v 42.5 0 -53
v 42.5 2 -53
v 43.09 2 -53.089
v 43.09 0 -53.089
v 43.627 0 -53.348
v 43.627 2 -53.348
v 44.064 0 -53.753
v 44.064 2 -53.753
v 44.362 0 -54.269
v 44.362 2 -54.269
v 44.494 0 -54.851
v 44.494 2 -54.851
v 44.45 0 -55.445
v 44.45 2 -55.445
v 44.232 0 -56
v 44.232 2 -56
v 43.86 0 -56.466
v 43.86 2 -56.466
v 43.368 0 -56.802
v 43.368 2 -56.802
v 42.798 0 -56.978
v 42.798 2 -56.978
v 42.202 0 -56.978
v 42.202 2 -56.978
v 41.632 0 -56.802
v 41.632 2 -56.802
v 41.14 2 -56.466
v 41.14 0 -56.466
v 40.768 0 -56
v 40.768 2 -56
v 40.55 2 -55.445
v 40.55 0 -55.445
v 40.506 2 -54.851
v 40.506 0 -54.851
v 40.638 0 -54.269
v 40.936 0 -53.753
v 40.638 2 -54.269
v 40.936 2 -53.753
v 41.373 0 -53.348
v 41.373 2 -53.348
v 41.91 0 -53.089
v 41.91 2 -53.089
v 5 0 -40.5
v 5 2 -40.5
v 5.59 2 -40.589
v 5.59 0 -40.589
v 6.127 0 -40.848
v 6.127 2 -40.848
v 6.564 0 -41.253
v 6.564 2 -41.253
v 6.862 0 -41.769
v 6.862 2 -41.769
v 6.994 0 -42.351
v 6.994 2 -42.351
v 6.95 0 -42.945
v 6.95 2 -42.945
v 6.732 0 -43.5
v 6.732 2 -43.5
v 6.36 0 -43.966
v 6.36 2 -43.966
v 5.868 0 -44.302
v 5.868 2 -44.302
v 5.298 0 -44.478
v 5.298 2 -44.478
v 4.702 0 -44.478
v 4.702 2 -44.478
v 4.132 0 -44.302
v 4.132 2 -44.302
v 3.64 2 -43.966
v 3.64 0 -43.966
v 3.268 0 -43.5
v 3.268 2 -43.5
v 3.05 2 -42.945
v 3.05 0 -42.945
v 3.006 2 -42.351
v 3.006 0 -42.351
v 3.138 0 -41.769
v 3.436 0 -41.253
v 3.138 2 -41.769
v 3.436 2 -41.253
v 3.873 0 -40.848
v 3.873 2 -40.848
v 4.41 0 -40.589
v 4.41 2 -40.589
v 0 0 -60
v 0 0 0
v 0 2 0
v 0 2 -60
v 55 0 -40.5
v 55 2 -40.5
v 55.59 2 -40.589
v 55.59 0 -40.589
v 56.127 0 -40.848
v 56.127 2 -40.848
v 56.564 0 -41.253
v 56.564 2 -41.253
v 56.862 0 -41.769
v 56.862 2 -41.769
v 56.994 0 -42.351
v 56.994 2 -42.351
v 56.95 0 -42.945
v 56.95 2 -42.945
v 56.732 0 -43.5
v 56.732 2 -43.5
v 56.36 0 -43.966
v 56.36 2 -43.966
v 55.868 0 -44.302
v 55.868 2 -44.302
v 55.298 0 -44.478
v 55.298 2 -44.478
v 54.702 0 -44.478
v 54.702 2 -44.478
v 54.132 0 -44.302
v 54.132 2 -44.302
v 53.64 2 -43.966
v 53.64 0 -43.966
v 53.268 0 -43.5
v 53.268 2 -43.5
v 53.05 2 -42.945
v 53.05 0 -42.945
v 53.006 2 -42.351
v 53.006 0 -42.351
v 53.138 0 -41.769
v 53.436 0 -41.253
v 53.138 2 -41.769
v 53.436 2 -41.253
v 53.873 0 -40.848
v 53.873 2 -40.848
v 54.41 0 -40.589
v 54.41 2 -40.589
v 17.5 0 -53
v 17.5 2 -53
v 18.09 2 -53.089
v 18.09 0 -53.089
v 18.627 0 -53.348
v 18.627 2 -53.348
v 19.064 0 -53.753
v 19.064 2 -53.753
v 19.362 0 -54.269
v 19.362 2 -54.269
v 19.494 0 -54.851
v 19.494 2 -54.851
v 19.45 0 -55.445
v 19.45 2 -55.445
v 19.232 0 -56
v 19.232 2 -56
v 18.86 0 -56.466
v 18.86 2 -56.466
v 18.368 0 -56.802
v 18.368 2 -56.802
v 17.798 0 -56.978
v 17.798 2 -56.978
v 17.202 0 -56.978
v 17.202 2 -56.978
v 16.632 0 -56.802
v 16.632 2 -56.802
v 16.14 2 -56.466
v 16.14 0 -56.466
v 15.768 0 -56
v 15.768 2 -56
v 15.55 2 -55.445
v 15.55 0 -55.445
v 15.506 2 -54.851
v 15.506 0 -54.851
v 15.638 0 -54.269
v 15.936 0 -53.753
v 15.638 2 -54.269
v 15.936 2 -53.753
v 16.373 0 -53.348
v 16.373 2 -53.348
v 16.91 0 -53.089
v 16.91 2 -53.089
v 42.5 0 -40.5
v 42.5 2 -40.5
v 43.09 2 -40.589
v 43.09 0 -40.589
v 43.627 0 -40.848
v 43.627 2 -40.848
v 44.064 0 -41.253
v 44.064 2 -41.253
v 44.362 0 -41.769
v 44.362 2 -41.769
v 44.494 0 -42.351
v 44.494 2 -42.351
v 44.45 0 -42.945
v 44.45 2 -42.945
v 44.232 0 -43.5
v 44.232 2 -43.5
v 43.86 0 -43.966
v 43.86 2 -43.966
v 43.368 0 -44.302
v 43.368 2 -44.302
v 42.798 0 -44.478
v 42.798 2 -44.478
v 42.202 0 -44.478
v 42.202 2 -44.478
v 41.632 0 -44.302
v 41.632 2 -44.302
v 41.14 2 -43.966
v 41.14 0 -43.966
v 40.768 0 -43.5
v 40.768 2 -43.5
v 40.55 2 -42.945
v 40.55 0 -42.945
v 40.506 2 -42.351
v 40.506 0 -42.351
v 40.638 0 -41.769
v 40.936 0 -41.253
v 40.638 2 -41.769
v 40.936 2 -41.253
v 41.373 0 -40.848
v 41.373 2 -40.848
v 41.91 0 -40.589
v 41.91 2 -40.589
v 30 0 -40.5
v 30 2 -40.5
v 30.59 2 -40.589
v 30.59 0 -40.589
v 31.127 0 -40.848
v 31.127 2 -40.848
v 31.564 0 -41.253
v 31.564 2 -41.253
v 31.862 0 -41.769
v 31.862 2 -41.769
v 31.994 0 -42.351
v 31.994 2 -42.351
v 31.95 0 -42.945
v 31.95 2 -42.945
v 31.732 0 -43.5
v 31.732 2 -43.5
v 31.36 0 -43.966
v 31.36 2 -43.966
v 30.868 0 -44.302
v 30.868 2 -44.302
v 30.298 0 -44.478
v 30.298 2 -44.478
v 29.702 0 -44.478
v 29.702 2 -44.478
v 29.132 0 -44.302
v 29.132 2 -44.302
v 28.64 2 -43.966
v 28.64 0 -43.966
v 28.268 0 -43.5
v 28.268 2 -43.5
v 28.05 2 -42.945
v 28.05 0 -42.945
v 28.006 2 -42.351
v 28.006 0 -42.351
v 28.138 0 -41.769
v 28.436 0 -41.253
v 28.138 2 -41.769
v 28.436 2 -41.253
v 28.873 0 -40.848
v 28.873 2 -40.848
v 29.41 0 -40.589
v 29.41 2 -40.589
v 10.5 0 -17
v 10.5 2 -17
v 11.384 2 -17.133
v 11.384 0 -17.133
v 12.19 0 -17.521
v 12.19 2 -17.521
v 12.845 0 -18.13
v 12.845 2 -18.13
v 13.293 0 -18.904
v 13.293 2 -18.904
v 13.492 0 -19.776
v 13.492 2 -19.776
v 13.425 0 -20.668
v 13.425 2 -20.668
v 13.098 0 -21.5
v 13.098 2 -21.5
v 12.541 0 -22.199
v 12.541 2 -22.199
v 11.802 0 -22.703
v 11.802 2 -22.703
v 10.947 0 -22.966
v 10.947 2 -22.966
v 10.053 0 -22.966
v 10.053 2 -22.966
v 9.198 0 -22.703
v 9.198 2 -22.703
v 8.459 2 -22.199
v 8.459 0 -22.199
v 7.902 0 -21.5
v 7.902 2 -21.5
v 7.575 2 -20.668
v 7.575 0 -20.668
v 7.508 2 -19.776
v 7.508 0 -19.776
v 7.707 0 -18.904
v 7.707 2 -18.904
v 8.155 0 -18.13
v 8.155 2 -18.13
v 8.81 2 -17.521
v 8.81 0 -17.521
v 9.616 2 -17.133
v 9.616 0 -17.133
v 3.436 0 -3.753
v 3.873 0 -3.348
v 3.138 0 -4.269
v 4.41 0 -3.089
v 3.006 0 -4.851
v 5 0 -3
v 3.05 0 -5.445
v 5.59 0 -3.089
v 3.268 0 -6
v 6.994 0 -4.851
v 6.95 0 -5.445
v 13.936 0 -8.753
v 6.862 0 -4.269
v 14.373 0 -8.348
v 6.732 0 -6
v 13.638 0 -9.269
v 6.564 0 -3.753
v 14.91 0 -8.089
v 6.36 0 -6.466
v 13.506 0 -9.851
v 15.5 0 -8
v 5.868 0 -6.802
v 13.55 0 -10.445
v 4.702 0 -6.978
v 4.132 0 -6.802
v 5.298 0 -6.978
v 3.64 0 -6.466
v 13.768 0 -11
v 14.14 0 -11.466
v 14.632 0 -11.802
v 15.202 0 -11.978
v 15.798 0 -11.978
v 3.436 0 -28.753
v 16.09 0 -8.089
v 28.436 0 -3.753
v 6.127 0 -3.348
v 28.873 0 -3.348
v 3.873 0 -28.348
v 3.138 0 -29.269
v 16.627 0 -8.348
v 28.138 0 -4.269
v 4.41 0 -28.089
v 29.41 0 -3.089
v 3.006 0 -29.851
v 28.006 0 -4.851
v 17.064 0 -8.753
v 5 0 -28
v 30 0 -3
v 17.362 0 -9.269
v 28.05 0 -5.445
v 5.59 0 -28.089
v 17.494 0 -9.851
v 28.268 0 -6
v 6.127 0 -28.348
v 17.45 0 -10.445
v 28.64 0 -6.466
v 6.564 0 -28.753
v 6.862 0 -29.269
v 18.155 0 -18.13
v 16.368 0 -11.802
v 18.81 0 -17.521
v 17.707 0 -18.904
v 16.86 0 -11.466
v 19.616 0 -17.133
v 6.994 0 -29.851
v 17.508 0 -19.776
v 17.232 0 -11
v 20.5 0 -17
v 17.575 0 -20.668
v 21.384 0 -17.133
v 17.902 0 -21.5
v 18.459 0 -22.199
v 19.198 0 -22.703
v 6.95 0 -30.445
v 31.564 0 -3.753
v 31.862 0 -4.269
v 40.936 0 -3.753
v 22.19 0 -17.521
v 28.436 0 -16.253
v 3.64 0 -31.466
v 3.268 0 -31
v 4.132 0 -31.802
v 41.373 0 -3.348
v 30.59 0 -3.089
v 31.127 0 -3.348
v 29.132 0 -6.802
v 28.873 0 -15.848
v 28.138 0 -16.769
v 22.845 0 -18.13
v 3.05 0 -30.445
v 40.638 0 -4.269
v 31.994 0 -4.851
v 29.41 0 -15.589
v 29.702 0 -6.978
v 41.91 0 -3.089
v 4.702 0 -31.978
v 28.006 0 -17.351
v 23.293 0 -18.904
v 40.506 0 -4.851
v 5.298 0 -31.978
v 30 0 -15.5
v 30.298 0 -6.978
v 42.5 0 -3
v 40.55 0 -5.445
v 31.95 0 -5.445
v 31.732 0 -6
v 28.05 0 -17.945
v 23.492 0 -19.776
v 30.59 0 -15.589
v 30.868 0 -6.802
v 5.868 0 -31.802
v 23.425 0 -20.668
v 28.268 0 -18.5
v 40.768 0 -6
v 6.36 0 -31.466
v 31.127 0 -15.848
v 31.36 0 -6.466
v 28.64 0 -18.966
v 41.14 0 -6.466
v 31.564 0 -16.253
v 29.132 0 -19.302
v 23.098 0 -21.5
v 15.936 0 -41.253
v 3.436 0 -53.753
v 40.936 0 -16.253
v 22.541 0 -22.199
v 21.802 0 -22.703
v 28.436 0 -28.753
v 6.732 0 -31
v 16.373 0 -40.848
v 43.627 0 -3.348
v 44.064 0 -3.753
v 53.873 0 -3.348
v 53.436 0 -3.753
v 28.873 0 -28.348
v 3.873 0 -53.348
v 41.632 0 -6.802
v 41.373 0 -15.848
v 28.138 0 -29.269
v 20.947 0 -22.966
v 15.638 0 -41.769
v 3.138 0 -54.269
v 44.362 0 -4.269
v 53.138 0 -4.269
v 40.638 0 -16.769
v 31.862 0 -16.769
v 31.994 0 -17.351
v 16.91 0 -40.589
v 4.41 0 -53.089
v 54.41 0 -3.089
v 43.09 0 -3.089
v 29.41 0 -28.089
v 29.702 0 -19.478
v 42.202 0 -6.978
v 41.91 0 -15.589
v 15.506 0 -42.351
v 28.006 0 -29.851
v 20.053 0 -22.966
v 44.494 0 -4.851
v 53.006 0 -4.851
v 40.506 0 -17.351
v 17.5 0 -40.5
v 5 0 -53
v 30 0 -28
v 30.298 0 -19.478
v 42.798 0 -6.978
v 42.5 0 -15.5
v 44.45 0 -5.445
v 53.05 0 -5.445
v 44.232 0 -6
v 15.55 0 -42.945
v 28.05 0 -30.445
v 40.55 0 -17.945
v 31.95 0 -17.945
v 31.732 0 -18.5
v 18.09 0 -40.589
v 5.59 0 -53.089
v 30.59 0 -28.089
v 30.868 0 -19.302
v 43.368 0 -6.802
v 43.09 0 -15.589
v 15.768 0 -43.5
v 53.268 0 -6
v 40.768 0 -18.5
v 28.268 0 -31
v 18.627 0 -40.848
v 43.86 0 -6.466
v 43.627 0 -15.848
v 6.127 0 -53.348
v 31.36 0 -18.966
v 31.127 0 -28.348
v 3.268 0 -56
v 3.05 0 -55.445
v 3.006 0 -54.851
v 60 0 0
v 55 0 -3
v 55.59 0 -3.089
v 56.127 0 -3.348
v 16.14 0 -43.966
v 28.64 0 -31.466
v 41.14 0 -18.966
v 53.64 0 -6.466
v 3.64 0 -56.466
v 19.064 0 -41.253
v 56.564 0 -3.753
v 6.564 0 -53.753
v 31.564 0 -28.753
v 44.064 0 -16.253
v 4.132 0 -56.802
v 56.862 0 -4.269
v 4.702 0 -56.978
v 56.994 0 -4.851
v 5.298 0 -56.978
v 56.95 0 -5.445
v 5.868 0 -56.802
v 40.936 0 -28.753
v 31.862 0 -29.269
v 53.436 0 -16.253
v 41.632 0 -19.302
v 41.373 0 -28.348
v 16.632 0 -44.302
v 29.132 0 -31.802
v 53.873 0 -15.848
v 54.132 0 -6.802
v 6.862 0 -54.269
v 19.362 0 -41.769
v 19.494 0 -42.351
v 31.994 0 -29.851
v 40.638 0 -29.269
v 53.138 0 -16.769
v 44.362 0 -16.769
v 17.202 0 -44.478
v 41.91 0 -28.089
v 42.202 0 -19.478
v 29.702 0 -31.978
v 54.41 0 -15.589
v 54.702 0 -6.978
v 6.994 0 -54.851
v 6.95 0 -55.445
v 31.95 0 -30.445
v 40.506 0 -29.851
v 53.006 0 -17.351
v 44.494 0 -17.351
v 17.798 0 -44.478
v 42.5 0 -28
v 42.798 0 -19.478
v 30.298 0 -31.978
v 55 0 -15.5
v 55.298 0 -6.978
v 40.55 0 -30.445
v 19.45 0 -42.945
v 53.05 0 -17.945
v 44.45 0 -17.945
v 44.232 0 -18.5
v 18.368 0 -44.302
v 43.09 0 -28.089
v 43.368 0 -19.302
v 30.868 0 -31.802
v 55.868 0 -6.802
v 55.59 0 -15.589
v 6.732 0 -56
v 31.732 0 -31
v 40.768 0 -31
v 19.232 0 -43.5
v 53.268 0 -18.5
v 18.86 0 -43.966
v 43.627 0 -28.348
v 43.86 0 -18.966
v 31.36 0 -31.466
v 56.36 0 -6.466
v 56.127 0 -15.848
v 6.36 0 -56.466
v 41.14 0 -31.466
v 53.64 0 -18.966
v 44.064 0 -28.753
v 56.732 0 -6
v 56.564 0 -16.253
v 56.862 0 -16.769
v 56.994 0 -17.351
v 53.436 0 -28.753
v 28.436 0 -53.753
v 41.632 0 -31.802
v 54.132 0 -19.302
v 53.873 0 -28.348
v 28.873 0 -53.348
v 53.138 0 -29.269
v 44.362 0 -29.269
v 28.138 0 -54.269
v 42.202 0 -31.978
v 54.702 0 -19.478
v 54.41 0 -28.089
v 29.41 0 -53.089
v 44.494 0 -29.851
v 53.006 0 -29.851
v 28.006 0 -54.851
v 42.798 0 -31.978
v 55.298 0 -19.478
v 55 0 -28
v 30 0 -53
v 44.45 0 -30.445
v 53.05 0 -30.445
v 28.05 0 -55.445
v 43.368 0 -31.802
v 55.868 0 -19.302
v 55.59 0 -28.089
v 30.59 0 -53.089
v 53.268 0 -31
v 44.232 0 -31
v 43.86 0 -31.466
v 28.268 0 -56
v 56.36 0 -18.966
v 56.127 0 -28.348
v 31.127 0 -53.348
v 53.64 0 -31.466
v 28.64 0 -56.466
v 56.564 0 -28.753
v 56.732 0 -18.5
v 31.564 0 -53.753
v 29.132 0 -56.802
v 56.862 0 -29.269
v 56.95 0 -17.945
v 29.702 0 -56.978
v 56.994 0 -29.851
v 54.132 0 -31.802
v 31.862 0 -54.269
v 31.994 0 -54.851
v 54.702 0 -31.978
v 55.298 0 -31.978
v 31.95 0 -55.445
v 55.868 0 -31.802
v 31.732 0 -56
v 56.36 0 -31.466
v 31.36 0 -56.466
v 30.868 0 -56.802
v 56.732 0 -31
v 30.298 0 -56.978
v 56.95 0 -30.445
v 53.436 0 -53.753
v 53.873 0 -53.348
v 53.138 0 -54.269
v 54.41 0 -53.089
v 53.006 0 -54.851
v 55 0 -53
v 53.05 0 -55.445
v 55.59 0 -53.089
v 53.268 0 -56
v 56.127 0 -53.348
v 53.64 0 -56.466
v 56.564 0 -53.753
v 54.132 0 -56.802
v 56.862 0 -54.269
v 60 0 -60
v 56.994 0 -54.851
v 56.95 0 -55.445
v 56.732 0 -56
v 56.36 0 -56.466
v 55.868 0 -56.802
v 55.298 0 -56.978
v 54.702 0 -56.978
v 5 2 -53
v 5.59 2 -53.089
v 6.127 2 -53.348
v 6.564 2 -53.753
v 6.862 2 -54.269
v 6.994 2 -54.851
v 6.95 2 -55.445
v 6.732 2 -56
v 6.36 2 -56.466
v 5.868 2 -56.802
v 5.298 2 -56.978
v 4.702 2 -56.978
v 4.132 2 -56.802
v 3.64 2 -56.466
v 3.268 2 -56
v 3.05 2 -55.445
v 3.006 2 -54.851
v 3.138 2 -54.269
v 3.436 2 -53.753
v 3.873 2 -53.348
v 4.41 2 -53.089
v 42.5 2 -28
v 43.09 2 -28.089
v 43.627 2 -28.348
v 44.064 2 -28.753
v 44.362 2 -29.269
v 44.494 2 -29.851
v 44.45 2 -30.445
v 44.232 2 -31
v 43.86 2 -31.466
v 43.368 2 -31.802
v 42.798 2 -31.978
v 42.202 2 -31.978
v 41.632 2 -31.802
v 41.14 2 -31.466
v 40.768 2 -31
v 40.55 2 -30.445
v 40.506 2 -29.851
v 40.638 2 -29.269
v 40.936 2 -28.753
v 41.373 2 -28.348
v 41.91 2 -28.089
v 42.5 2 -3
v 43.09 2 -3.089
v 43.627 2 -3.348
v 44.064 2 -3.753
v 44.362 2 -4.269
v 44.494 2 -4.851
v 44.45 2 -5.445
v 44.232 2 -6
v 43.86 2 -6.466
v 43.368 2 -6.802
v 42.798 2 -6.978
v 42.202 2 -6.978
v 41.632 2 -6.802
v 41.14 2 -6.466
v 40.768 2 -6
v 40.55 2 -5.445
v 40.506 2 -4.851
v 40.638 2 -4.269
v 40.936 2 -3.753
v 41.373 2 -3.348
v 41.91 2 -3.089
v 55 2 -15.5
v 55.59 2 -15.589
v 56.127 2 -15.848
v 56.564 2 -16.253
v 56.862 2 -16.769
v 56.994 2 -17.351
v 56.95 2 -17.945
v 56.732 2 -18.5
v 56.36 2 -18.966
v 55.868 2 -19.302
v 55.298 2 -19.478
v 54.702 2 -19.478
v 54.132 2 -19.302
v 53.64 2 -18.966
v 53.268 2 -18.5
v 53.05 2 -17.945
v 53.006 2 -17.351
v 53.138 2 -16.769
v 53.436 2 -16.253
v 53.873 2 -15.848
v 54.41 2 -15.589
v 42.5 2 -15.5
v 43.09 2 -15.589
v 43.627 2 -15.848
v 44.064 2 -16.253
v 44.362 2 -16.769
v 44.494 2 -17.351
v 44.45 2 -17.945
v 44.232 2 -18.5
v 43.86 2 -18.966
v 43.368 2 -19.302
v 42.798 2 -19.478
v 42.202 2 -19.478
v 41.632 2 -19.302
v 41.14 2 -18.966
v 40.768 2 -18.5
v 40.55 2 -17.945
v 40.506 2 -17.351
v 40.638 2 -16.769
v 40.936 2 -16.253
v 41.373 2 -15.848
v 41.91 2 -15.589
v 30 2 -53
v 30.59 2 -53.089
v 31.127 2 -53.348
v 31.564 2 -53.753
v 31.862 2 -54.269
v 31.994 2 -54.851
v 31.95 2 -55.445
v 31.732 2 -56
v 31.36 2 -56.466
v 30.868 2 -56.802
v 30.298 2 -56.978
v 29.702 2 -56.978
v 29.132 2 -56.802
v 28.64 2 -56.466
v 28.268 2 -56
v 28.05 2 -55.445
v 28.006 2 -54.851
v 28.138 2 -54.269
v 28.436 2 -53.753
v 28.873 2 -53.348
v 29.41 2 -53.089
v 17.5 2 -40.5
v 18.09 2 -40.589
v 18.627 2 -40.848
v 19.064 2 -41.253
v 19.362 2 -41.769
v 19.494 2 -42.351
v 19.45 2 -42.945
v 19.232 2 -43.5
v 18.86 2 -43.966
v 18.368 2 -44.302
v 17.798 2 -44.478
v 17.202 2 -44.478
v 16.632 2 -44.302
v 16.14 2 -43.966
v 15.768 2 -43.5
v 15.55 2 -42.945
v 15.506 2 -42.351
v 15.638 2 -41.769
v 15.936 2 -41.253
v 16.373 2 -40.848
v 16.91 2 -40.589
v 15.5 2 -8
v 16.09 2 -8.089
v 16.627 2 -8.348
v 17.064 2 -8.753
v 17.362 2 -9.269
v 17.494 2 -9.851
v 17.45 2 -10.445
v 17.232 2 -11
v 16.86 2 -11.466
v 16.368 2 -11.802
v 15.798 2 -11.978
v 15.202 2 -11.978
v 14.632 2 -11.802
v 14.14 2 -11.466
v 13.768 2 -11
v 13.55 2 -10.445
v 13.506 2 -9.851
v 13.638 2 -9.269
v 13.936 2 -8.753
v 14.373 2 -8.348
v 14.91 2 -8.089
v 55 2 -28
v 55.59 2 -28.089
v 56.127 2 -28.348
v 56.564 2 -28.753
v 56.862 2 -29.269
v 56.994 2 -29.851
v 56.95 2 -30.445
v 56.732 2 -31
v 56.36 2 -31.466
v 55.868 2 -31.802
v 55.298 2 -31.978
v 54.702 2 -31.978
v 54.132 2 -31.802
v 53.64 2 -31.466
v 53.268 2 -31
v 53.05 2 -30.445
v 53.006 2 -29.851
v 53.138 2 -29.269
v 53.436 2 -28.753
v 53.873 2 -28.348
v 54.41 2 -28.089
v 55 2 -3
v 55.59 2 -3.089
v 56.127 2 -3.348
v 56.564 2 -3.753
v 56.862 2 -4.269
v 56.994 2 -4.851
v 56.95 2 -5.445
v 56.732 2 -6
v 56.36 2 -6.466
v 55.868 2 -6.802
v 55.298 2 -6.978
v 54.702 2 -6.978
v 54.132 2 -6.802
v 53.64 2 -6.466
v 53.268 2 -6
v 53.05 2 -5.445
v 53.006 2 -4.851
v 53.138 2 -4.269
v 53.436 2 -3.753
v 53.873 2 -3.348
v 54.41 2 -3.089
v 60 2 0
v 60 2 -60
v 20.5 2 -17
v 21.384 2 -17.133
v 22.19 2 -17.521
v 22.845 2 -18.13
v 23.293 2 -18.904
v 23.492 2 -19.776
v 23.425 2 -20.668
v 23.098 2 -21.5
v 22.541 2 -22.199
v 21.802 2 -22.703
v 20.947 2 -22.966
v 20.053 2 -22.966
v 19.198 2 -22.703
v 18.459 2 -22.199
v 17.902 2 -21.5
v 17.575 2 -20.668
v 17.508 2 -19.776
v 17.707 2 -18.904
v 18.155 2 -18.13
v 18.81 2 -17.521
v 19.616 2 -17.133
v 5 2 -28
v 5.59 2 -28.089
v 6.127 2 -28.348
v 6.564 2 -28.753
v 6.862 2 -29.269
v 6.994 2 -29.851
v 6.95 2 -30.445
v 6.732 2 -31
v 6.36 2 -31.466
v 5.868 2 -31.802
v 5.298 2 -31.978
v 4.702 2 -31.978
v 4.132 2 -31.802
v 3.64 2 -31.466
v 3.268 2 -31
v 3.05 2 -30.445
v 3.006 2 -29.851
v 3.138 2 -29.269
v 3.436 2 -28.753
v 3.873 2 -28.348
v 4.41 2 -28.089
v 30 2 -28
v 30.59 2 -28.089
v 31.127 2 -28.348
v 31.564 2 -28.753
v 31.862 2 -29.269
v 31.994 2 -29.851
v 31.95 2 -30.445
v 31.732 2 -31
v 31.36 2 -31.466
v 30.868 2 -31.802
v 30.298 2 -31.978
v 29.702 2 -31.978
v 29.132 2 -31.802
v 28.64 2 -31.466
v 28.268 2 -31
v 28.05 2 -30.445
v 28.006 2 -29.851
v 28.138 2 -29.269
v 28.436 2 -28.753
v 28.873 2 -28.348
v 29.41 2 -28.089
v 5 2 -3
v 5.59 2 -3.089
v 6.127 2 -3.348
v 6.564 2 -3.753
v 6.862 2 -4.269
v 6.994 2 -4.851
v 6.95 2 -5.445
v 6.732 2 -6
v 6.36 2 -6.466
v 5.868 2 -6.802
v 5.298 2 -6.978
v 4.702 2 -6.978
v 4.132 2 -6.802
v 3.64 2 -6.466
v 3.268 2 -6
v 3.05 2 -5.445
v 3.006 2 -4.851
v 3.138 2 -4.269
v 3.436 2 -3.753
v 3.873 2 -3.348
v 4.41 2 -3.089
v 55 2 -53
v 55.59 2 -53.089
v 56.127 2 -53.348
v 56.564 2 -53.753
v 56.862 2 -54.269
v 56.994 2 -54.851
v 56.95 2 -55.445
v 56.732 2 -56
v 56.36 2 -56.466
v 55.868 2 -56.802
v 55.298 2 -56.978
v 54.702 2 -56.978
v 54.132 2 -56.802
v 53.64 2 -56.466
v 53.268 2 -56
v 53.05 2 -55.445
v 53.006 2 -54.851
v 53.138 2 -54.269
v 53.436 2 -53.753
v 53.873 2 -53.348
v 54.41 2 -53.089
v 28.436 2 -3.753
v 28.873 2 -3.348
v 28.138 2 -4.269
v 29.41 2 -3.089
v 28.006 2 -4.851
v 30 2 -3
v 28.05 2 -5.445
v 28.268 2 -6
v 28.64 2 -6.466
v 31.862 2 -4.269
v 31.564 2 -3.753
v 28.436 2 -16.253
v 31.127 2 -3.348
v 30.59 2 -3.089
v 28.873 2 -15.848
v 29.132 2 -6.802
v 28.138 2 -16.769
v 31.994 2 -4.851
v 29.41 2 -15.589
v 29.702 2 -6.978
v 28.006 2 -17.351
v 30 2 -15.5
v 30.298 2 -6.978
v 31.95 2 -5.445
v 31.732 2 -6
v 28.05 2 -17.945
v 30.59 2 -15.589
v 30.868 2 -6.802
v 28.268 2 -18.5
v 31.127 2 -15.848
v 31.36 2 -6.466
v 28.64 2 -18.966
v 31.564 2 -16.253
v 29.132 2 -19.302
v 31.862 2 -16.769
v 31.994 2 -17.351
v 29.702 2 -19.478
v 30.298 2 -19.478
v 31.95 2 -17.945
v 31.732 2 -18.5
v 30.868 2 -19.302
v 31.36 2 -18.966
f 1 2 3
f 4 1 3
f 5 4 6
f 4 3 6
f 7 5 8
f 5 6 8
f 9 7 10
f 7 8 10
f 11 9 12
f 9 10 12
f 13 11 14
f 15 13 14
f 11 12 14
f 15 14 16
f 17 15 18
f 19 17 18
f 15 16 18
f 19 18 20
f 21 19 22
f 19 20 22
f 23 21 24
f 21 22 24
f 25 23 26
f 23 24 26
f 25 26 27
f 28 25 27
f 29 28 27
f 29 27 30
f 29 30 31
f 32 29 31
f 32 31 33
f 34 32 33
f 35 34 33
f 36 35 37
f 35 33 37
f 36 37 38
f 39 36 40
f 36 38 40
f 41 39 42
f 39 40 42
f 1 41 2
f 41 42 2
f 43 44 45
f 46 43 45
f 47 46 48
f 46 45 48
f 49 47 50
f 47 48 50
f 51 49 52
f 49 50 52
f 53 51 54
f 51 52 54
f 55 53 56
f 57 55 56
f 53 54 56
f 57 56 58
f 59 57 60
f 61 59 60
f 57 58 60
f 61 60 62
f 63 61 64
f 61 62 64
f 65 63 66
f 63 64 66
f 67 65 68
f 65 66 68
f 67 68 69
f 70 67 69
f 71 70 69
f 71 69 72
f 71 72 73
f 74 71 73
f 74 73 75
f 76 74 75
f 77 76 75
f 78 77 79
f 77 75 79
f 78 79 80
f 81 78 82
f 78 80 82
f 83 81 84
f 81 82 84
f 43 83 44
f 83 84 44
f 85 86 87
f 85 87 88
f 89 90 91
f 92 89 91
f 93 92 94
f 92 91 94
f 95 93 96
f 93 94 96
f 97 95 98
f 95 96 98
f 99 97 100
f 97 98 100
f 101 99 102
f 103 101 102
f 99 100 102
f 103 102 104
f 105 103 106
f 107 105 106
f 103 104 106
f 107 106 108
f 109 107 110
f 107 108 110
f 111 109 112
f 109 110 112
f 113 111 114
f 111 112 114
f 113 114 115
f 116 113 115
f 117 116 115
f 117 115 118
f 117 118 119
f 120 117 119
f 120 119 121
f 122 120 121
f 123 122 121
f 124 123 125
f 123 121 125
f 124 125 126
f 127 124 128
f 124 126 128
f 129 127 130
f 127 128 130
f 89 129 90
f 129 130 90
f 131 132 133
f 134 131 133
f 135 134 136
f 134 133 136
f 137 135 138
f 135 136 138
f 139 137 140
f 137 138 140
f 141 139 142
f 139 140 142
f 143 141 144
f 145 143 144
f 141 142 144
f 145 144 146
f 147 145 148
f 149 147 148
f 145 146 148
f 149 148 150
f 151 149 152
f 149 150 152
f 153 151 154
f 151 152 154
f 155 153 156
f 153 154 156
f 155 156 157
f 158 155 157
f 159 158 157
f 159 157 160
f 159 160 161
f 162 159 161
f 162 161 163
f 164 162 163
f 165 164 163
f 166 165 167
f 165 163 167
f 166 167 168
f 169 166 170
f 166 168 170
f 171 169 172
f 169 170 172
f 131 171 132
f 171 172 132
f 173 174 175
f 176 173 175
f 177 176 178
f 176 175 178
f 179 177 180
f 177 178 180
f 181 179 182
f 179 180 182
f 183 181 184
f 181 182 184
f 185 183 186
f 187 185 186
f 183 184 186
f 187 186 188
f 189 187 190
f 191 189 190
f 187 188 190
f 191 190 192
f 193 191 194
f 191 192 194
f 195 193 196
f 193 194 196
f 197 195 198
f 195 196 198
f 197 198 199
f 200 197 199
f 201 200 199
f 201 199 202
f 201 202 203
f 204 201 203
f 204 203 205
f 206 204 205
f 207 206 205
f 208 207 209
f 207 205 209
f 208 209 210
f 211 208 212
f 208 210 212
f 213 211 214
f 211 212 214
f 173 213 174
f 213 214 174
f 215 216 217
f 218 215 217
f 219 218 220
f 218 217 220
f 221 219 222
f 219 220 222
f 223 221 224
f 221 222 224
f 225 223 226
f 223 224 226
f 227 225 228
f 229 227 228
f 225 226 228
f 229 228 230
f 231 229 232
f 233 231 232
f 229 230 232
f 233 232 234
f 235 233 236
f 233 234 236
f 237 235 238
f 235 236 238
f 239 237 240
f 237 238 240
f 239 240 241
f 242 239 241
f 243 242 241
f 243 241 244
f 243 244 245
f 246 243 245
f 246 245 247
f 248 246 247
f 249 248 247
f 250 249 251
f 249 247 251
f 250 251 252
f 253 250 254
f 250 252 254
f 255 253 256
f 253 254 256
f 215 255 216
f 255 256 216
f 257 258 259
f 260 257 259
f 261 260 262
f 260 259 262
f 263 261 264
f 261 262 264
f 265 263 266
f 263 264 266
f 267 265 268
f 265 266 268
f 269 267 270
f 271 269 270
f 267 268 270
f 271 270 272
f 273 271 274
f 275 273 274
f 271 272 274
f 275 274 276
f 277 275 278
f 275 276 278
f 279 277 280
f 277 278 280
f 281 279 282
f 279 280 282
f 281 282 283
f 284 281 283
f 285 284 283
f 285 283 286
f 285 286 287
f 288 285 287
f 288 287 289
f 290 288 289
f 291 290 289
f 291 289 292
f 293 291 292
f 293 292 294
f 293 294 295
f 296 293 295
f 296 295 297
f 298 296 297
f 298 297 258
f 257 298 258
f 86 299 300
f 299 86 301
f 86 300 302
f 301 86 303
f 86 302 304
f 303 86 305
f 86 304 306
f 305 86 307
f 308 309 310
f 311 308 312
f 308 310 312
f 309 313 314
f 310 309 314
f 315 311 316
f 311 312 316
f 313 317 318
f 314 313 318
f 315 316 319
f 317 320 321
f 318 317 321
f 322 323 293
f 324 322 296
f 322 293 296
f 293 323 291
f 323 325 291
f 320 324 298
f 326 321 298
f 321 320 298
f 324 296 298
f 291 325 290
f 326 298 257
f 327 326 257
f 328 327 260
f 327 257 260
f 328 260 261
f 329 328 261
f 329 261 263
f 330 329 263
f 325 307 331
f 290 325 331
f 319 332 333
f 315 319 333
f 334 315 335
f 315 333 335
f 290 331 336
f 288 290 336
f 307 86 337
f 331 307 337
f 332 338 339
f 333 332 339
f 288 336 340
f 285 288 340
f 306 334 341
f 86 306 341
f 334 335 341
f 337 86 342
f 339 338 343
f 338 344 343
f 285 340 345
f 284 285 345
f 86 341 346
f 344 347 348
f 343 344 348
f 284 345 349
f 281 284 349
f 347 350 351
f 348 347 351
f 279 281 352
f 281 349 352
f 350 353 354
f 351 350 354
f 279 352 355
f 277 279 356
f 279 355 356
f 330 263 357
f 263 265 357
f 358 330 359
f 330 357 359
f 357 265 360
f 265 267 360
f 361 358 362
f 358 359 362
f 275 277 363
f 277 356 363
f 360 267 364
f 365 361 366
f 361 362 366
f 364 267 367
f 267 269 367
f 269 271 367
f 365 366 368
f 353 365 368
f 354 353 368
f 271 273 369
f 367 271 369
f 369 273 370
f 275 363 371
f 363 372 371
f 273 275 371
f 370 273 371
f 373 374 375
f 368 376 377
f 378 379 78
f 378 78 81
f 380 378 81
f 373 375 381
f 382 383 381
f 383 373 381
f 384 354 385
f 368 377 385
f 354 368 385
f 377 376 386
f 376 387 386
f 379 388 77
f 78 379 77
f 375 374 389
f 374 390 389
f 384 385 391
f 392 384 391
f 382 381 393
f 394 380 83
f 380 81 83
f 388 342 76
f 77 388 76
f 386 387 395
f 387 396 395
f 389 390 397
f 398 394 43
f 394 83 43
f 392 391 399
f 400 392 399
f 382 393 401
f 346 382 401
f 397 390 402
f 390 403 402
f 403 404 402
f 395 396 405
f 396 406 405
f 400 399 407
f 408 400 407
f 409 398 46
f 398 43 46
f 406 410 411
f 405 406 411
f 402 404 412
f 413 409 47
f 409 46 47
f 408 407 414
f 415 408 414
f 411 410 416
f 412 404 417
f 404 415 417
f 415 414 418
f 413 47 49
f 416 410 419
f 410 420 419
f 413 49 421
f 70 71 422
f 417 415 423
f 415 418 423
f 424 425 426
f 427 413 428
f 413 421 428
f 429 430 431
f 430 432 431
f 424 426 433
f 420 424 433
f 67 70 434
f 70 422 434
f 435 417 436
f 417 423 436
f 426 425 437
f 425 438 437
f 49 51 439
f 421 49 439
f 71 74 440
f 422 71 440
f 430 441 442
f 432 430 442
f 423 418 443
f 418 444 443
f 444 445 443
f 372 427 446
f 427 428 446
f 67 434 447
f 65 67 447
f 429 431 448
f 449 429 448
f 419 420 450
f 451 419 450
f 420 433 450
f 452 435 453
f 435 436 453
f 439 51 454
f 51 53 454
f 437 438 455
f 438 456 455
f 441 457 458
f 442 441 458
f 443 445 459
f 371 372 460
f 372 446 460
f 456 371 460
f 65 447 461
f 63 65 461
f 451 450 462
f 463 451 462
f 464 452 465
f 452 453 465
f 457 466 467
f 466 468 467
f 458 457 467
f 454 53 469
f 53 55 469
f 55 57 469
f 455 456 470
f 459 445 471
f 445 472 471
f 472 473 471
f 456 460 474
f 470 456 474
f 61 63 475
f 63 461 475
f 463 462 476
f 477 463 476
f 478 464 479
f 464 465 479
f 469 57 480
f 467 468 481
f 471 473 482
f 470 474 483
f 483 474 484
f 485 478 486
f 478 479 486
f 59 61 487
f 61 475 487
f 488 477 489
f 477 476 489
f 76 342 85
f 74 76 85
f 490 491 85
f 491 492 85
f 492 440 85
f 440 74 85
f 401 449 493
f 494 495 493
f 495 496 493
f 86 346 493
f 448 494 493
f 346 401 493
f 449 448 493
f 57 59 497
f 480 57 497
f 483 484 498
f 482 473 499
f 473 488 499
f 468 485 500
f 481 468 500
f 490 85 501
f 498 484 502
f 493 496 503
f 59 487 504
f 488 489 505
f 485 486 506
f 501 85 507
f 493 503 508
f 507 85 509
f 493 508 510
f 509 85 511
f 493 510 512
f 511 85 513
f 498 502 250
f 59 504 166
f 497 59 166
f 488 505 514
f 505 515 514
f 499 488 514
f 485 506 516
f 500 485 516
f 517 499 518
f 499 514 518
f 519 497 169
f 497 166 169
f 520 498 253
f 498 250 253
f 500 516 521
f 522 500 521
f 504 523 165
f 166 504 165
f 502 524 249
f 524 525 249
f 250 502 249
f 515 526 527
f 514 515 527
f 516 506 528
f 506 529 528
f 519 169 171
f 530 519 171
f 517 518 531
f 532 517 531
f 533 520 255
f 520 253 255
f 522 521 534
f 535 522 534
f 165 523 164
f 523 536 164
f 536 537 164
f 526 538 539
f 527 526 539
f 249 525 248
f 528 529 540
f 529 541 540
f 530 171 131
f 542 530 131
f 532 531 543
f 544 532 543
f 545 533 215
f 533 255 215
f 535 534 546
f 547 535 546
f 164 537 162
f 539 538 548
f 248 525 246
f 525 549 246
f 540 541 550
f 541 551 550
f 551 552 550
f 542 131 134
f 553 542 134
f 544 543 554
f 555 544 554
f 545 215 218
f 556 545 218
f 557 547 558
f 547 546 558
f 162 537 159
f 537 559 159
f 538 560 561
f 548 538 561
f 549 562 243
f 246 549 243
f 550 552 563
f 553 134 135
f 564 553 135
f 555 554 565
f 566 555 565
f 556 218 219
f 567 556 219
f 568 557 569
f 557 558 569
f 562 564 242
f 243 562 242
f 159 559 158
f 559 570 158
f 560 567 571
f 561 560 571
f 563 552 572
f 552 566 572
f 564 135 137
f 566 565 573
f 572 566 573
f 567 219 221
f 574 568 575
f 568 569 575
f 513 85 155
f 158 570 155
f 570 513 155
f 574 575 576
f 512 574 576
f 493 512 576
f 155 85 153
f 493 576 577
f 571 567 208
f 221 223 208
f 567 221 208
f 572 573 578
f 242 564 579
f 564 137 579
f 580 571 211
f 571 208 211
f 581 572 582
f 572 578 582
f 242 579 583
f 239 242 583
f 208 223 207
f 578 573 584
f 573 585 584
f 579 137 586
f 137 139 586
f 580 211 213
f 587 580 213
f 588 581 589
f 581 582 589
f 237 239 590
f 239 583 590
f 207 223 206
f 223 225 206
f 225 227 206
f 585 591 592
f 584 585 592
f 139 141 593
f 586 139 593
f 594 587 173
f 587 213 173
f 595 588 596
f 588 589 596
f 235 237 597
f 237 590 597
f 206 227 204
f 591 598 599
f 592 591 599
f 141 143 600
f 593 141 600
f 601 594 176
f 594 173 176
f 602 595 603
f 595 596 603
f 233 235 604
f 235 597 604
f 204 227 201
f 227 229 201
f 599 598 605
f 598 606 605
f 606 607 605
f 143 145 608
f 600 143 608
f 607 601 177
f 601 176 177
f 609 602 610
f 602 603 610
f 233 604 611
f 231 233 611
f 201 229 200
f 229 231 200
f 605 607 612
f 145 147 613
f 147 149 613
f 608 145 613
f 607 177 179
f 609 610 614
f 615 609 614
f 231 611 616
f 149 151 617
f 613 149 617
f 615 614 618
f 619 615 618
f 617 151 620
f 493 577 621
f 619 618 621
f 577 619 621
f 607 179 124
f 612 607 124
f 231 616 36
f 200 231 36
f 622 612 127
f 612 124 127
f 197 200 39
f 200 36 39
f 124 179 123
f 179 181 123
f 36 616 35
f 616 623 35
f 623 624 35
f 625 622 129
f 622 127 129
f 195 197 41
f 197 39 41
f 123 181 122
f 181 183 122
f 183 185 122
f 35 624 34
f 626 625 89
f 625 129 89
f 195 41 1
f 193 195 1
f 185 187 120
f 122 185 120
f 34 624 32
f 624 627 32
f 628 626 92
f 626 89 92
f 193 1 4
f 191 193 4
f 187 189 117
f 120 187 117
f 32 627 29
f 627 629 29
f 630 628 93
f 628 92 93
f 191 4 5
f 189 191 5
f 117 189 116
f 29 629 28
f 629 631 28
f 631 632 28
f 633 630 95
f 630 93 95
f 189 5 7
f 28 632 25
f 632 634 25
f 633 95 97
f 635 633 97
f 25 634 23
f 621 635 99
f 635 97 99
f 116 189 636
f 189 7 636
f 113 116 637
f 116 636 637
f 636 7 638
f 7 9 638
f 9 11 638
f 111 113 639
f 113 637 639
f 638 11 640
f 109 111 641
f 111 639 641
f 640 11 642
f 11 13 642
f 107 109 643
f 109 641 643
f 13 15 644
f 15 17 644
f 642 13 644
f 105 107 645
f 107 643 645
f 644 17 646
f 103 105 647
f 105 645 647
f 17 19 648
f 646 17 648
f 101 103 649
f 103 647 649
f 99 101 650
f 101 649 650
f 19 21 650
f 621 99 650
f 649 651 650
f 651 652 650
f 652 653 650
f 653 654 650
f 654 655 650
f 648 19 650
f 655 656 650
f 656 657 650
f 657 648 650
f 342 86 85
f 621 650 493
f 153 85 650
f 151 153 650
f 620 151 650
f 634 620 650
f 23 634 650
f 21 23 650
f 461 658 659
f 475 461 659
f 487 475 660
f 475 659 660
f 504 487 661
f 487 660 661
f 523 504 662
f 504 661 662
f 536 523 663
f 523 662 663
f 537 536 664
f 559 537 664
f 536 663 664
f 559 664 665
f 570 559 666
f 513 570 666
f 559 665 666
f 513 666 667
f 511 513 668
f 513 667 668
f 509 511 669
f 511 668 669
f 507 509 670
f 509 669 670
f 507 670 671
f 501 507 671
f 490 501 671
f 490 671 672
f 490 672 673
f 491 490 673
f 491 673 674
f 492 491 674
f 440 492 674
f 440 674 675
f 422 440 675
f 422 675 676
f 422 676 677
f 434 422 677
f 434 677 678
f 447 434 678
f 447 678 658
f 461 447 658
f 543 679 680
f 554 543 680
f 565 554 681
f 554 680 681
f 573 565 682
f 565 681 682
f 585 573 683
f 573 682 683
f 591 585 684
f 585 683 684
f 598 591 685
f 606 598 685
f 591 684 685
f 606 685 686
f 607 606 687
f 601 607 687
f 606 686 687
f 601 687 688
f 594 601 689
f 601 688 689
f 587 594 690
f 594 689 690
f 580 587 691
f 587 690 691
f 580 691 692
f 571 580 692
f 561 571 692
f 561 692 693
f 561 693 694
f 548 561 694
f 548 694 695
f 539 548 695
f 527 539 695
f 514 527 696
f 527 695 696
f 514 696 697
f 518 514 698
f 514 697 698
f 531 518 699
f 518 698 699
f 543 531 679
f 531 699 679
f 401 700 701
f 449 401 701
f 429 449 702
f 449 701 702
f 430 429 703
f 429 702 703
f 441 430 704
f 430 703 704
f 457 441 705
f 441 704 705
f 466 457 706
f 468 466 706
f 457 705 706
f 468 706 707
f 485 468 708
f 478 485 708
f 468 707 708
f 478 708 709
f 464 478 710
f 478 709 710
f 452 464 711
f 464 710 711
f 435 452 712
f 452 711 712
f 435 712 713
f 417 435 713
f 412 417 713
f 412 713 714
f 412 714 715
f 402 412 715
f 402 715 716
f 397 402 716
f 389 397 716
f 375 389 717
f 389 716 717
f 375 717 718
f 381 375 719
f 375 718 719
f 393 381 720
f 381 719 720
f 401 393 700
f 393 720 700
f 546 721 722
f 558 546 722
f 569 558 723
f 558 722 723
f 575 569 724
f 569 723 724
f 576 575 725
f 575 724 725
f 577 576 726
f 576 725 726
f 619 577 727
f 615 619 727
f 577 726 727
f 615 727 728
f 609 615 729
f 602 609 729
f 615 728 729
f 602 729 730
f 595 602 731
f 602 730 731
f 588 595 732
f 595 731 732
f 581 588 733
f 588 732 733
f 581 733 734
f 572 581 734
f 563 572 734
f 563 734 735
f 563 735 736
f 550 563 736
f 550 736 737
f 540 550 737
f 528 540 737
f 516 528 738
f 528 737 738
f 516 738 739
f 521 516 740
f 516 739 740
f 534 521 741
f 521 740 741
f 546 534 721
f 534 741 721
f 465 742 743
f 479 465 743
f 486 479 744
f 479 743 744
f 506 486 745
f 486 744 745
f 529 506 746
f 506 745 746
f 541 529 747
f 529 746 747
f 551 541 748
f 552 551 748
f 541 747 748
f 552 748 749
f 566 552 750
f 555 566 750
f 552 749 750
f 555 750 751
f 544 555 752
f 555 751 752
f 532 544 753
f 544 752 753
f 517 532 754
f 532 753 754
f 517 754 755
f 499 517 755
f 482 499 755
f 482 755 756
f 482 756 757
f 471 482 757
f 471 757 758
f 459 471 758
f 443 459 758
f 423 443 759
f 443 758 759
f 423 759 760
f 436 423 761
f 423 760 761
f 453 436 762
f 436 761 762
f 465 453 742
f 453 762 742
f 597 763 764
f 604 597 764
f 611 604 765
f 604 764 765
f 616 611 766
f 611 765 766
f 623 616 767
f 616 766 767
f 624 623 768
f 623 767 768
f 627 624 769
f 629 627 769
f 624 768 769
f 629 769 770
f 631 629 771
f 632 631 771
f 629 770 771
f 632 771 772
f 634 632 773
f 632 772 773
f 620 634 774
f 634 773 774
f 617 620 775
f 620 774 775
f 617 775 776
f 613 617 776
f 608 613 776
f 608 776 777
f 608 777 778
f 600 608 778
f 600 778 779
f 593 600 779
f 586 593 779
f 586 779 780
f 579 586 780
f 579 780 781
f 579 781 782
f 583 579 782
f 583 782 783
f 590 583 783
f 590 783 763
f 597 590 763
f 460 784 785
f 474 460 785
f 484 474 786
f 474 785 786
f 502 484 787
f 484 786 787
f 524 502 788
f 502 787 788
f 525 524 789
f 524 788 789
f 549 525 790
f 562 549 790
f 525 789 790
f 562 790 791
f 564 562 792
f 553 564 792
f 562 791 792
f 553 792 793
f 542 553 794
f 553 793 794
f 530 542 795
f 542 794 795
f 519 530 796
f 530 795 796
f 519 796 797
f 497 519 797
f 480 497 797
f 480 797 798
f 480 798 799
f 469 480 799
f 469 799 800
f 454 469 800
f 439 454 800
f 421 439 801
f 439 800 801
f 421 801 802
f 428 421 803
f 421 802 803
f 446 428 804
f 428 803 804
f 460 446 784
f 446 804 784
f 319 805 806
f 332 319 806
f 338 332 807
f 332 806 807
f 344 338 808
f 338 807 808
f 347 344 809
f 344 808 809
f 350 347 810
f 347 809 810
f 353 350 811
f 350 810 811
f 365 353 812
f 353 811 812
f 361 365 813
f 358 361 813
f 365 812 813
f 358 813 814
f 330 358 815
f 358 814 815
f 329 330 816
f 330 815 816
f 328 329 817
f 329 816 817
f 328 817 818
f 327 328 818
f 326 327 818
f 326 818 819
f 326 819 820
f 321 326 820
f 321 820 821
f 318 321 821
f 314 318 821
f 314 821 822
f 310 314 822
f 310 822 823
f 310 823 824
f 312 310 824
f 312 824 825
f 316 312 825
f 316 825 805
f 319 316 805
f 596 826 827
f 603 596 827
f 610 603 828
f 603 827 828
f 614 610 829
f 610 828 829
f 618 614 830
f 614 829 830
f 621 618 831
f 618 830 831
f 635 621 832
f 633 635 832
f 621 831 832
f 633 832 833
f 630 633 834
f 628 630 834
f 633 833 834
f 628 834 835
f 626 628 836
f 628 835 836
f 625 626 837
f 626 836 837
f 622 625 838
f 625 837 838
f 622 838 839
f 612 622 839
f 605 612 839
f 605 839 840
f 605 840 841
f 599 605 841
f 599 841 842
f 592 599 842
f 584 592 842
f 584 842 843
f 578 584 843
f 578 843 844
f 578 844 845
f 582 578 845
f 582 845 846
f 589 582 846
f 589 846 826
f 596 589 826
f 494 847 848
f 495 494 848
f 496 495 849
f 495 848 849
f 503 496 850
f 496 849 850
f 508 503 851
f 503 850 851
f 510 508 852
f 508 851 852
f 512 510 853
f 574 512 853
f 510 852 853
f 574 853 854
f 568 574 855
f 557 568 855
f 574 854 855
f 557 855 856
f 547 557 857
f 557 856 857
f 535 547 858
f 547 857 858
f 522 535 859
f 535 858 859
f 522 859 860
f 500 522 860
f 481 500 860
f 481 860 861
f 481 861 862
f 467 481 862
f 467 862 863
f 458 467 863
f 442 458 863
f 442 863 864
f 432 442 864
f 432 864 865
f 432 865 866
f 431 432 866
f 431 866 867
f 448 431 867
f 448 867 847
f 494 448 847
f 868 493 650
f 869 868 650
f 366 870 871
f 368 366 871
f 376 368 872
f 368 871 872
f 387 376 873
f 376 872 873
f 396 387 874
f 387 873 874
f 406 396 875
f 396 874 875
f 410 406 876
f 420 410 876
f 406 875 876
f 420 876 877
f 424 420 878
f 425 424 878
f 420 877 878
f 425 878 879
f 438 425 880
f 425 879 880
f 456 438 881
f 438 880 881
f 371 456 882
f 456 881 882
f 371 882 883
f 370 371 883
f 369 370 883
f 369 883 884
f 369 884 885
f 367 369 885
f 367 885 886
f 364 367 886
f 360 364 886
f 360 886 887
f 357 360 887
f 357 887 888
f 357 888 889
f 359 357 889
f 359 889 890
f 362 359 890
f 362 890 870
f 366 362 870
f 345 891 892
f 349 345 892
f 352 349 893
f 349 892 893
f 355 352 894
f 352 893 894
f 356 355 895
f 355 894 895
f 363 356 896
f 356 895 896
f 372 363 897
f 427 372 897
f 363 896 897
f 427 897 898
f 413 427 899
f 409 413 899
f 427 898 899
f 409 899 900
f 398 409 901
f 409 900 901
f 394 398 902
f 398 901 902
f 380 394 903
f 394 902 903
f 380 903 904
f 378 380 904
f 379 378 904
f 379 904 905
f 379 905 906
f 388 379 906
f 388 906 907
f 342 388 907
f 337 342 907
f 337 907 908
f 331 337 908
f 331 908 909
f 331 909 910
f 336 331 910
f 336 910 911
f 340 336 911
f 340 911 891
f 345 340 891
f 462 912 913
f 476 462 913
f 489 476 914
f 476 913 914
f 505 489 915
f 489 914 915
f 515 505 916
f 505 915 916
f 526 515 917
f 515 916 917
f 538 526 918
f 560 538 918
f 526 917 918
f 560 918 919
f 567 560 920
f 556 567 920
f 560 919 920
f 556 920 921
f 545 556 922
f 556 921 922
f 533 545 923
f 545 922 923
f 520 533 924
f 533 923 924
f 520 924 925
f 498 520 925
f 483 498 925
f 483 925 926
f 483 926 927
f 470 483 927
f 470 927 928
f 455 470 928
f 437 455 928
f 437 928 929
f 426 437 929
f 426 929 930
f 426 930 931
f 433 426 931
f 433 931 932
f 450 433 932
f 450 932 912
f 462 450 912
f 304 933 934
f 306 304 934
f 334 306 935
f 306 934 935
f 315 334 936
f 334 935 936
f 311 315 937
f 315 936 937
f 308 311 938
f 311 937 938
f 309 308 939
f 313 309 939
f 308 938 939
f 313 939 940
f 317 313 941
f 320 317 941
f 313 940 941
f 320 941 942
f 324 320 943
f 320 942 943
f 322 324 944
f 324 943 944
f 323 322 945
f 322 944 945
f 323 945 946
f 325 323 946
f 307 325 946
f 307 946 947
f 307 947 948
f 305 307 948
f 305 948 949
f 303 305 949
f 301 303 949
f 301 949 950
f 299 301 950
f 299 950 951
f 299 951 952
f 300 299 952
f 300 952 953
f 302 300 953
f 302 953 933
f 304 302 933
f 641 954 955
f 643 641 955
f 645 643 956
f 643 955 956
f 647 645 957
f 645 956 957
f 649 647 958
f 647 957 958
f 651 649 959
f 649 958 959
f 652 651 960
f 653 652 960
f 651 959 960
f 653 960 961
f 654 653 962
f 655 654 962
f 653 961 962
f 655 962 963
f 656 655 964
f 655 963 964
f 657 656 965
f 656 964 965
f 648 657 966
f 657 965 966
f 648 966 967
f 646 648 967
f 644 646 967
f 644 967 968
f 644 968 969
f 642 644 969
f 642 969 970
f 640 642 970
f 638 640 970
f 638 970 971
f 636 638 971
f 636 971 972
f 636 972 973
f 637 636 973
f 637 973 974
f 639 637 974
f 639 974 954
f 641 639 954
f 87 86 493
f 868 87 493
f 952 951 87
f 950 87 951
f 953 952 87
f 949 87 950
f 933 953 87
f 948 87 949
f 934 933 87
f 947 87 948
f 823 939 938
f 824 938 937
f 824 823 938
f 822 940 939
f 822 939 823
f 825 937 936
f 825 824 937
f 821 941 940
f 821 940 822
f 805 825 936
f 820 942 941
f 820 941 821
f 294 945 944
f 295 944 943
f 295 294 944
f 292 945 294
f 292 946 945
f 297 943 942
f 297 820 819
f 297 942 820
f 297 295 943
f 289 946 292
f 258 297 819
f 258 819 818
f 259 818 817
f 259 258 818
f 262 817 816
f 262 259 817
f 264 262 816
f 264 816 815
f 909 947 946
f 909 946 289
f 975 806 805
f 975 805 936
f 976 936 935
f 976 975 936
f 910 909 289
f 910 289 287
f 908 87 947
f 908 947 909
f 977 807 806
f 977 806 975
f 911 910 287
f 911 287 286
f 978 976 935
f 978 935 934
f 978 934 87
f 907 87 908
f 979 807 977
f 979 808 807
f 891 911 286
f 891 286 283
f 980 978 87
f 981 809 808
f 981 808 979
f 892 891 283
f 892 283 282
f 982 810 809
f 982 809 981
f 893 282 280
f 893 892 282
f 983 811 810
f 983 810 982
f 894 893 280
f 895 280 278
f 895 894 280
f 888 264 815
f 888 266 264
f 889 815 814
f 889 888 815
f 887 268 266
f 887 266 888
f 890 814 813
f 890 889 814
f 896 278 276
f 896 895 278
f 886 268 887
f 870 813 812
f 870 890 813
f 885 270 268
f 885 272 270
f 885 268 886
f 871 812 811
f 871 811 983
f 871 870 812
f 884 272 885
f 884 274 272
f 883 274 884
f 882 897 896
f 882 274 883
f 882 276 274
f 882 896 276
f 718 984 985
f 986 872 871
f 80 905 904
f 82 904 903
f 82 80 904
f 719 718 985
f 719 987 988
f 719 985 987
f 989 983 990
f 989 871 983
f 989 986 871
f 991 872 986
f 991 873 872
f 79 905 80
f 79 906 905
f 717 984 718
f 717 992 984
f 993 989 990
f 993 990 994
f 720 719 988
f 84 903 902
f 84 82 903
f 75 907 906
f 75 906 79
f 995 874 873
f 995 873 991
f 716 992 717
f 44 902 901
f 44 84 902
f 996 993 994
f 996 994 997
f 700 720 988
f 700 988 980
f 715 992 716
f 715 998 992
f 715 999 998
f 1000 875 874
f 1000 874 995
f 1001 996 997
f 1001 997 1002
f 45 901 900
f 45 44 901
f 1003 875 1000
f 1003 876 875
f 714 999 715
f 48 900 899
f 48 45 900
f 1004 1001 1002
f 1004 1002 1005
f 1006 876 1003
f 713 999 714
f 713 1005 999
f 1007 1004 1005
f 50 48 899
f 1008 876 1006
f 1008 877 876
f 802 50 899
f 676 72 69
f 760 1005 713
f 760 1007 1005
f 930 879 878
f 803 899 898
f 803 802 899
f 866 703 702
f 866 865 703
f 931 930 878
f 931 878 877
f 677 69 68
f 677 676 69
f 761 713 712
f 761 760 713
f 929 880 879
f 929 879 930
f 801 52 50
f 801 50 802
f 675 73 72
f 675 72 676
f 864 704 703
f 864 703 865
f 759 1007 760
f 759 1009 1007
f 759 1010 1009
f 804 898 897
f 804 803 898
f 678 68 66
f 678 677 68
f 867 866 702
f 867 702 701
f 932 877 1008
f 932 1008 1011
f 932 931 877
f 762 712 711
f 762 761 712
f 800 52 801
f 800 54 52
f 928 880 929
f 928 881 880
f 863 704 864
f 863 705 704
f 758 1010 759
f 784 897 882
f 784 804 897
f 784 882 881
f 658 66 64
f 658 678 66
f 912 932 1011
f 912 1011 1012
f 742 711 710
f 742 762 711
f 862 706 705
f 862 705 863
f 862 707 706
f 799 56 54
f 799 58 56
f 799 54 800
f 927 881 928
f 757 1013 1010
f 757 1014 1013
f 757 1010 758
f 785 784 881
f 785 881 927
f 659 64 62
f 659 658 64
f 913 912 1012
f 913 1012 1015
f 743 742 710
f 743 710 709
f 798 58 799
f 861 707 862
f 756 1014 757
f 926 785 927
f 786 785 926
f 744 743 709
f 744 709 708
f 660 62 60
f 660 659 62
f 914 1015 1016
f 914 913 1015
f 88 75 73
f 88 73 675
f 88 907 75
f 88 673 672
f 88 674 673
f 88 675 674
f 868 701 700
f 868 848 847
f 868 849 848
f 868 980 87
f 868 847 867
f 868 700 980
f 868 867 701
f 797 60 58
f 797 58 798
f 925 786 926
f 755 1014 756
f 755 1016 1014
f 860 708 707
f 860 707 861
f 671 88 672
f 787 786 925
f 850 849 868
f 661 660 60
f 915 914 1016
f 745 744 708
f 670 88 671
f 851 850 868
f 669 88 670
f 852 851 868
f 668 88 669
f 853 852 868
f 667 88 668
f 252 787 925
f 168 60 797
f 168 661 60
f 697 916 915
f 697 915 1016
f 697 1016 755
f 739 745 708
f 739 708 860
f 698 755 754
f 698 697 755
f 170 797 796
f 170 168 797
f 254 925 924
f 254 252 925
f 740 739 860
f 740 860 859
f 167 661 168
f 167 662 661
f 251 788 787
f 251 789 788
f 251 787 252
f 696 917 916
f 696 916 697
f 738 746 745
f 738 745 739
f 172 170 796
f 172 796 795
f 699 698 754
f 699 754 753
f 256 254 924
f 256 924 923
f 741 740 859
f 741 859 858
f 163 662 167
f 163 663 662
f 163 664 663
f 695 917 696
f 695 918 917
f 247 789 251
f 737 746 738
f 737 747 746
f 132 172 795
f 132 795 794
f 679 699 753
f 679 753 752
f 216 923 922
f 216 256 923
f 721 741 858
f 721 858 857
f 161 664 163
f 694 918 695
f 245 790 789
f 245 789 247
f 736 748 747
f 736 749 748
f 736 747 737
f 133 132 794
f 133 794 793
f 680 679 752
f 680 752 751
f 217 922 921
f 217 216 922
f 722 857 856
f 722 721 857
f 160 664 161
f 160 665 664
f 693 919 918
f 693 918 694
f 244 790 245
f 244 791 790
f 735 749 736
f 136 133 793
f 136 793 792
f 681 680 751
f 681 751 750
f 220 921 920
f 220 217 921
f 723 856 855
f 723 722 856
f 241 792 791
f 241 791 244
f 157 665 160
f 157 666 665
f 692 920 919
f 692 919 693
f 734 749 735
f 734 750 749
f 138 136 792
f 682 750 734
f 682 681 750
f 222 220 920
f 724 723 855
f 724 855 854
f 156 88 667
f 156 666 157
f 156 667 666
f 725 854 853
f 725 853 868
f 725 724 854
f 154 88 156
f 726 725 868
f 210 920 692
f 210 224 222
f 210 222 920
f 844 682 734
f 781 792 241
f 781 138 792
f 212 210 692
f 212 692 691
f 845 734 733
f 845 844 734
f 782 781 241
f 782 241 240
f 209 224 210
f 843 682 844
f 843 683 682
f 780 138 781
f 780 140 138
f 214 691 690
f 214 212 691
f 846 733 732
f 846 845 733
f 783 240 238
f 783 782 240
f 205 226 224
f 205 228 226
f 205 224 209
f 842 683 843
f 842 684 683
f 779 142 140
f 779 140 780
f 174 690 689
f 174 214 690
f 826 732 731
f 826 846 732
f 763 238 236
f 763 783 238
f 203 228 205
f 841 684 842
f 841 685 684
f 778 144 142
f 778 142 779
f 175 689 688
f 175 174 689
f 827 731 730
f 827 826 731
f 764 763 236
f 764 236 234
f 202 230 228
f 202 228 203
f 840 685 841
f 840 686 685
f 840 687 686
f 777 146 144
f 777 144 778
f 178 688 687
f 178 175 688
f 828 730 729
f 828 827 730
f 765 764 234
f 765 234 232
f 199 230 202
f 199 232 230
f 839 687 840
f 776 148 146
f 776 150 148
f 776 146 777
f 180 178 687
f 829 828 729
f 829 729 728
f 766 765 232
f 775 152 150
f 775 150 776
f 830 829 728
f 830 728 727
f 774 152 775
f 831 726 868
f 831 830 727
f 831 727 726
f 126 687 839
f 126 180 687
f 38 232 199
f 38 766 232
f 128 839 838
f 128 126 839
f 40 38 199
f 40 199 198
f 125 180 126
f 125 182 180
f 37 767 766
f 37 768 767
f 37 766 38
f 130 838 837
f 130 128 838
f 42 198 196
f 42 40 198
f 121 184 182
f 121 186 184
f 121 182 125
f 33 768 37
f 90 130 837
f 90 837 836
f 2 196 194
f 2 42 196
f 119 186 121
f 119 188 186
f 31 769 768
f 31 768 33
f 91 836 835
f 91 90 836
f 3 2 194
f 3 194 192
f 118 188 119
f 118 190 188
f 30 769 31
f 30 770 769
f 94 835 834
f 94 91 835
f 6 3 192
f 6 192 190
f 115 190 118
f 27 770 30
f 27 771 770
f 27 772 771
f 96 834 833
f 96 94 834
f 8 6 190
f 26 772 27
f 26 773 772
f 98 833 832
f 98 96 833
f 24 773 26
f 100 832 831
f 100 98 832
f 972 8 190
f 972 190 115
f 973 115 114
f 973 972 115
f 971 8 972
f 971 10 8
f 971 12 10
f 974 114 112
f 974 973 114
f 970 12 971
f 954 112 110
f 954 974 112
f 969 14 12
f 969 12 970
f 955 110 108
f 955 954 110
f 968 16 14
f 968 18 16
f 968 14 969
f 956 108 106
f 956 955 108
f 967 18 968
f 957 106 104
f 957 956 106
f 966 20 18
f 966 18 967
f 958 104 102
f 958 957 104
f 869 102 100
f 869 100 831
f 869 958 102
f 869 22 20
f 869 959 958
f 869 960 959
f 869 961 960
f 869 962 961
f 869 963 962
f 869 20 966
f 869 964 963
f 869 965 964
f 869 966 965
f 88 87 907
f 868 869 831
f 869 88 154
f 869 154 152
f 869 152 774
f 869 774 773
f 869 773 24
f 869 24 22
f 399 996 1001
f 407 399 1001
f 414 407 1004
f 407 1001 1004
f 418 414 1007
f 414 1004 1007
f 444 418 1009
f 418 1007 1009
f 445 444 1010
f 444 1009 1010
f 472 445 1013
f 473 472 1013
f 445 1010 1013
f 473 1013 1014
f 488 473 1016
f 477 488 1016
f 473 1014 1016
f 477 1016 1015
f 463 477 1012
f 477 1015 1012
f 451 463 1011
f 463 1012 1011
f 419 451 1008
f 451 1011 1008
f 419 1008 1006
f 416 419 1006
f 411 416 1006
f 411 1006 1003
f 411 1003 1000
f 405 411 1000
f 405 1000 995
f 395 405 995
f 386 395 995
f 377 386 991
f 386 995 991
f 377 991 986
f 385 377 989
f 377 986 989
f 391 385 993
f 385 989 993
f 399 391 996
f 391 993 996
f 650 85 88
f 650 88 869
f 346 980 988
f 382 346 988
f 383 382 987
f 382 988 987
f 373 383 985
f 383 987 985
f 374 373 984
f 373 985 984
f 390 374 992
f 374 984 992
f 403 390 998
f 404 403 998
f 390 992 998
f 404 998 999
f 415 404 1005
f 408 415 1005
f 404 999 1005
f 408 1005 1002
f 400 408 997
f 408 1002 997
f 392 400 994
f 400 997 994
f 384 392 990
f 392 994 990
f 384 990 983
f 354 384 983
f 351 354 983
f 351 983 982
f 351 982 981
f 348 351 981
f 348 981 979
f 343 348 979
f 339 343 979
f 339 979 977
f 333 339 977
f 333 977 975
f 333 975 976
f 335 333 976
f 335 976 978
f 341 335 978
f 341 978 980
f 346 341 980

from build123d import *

# Parameters (mm, degrees)
ESQUISSE1_W             = 60
ESQUISSE1_H             = 60
BOSS_EXTRU_1_DEPTH      = 2
ESQUISSE4_R             = 3
ESQUISSE4_R_2           = 2
ENL_V_MAT_EXTRU_1_DEPTH = 10
ESQUISSE5_R             = 2
ENL_V_MAT_EXTRU_2_DEPTH = 10
ESQUISSE12_R            = 2
ENL_V_MAT_EXTRU_5_DEPTH = 2


with BuildPart() as part:
    # Esquisse1 → Boss.-Extru.1 (new body)
    with BuildSketch(Plane(origin=(0, 0, 0), x_dir=(1, 0, 0), z_dir=(0, 1, 0))):
        with Locations((30, 30)):
            Rectangle(ESQUISSE1_W, ESQUISSE1_H)
    extrude(amount=BOSS_EXTRU_1_DEPTH)

    # Esquisse4 → Enlèv. mat.-Extru.1 (cut)
    with BuildSketch(Plane(origin=(0, 2, 0), x_dir=(1, 0, 0), z_dir=(0, 1, 0))):
        with Locations(Location((10.5, 20, 0), (0, 0, 270))):  # turned: the seam where the file's is
            Circle(ESQUISSE4_R)
        with Locations(Location((20.5, 20, 0), (0, 0, 270))):  # turned: the seam where the file's is
            Circle(ESQUISSE4_R)
        with Locations(Location((15.5, 10, 0), (0, 0, 270))):  # turned: the seam where the file's is
            Circle(ESQUISSE4_R_2)
    extrude(amount=-ENL_V_MAT_EXTRU_1_DEPTH, mode=Mode.SUBTRACT)

    # Esquisse5 → Enlèv. mat.-Extru.2 (cut)
    with BuildSketch(Plane(origin=(0, 2, 0), x_dir=(1, 0, 0), z_dir=(0, 1, 0))):
        with Locations(Location((5, 5, 0), (0, 0, 270))):  # turned: the seam where the file's is
            Circle(ESQUISSE5_R)
        with Locations(Location((55, 5, 0), (0, 0, 270))):  # turned: the seam where the file's is
            Circle(ESQUISSE5_R)
        with Locations(Location((55, 55, 0), (0, 0, 270))):  # turned: the seam where the file's is
            Circle(ESQUISSE5_R)
        with Locations(Location((5, 55, 0), (0, 0, 270))):  # turned: the seam where the file's is
            Circle(ESQUISSE5_R)
        with Locations(Location((30, 55, 0), (0, 0, 270))):  # turned: the seam where the file's is
            Circle(ESQUISSE5_R)
        with Locations(Location((30, 5, 0), (0, 0, 270))):  # turned: the seam where the file's is
            Circle(ESQUISSE5_R)
        with Locations(Location((30, 30, 0), (0, 0, 270))):  # turned: the seam where the file's is
            Circle(ESQUISSE5_R)
        with Locations(Location((55, 30, 0), (0, 0, 270))):  # turned: the seam where the file's is
            Circle(ESQUISSE5_R)
        with Locations(Location((5, 30, 0), (0, 0, 270))):  # turned: the seam where the file's is
            Circle(ESQUISSE5_R)
    extrude(amount=-ENL_V_MAT_EXTRU_2_DEPTH, mode=Mode.SUBTRACT)

    # Esquisse12 → Enlèv. mat.-Extru.5 (cut)
    with BuildSketch(Plane(origin=(0, 2, 0), x_dir=(1, 0, 0), z_dir=(0, 1, 0))):
        with Locations(Location((17.5, 55, 0), (0, 0, 270))):  # turned: the seam where the file's is
            Circle(ESQUISSE12_R)
        with Locations(Location((42.5, 55, 0), (0, 0, 270))):  # turned: the seam where the file's is
            Circle(ESQUISSE12_R)
        with Locations(Location((42.5, 42.5, 0), (0, 0, 270))):  # turned: the seam where the file's is
            Circle(ESQUISSE12_R)
        with Locations(Location((17.5, 42.5, 0), (0, 0, 270))):  # turned: the seam where the file's is
            Circle(ESQUISSE12_R)
        with Locations(Location((42.5, 17.5, 0), (0, 0, 270))):  # turned: the seam where the file's is
            Circle(ESQUISSE12_R)
        with Locations(Location((55, 17.5, 0), (0, 0, 270))):  # turned: the seam where the file's is
            Circle(ESQUISSE12_R)
        with Locations(Location((55, 42.5, 0), (0, 0, 270))):  # turned: the seam where the file's is
            Circle(ESQUISSE12_R)
        with Locations(Location((42.5, 5, 0), (0, 0, 270))):  # turned: the seam where the file's is
            Circle(ESQUISSE12_R)
        with Locations(Location((42.5, 30, 0), (0, 0, 270))):  # turned: the seam where the file's is
            Circle(ESQUISSE12_R)
        with Locations(Location((5, 42.5, 0), (0, 0, 270))):  # turned: the seam where the file's is
            Circle(ESQUISSE12_R)
        with Locations(Location((30, 42.5, 0), (0, 0, 270))):  # turned: the seam where the file's is
            Circle(ESQUISSE12_R)
        with Locations(Location((30, 17.5, 0), (0, 0, 270))):  # turned: the seam where the file's is
            Circle(ESQUISSE12_R)
    extrude(amount=-ENL_V_MAT_EXTRU_5_DEPTH, mode=Mode.SUBTRACT)


solid = part.part
